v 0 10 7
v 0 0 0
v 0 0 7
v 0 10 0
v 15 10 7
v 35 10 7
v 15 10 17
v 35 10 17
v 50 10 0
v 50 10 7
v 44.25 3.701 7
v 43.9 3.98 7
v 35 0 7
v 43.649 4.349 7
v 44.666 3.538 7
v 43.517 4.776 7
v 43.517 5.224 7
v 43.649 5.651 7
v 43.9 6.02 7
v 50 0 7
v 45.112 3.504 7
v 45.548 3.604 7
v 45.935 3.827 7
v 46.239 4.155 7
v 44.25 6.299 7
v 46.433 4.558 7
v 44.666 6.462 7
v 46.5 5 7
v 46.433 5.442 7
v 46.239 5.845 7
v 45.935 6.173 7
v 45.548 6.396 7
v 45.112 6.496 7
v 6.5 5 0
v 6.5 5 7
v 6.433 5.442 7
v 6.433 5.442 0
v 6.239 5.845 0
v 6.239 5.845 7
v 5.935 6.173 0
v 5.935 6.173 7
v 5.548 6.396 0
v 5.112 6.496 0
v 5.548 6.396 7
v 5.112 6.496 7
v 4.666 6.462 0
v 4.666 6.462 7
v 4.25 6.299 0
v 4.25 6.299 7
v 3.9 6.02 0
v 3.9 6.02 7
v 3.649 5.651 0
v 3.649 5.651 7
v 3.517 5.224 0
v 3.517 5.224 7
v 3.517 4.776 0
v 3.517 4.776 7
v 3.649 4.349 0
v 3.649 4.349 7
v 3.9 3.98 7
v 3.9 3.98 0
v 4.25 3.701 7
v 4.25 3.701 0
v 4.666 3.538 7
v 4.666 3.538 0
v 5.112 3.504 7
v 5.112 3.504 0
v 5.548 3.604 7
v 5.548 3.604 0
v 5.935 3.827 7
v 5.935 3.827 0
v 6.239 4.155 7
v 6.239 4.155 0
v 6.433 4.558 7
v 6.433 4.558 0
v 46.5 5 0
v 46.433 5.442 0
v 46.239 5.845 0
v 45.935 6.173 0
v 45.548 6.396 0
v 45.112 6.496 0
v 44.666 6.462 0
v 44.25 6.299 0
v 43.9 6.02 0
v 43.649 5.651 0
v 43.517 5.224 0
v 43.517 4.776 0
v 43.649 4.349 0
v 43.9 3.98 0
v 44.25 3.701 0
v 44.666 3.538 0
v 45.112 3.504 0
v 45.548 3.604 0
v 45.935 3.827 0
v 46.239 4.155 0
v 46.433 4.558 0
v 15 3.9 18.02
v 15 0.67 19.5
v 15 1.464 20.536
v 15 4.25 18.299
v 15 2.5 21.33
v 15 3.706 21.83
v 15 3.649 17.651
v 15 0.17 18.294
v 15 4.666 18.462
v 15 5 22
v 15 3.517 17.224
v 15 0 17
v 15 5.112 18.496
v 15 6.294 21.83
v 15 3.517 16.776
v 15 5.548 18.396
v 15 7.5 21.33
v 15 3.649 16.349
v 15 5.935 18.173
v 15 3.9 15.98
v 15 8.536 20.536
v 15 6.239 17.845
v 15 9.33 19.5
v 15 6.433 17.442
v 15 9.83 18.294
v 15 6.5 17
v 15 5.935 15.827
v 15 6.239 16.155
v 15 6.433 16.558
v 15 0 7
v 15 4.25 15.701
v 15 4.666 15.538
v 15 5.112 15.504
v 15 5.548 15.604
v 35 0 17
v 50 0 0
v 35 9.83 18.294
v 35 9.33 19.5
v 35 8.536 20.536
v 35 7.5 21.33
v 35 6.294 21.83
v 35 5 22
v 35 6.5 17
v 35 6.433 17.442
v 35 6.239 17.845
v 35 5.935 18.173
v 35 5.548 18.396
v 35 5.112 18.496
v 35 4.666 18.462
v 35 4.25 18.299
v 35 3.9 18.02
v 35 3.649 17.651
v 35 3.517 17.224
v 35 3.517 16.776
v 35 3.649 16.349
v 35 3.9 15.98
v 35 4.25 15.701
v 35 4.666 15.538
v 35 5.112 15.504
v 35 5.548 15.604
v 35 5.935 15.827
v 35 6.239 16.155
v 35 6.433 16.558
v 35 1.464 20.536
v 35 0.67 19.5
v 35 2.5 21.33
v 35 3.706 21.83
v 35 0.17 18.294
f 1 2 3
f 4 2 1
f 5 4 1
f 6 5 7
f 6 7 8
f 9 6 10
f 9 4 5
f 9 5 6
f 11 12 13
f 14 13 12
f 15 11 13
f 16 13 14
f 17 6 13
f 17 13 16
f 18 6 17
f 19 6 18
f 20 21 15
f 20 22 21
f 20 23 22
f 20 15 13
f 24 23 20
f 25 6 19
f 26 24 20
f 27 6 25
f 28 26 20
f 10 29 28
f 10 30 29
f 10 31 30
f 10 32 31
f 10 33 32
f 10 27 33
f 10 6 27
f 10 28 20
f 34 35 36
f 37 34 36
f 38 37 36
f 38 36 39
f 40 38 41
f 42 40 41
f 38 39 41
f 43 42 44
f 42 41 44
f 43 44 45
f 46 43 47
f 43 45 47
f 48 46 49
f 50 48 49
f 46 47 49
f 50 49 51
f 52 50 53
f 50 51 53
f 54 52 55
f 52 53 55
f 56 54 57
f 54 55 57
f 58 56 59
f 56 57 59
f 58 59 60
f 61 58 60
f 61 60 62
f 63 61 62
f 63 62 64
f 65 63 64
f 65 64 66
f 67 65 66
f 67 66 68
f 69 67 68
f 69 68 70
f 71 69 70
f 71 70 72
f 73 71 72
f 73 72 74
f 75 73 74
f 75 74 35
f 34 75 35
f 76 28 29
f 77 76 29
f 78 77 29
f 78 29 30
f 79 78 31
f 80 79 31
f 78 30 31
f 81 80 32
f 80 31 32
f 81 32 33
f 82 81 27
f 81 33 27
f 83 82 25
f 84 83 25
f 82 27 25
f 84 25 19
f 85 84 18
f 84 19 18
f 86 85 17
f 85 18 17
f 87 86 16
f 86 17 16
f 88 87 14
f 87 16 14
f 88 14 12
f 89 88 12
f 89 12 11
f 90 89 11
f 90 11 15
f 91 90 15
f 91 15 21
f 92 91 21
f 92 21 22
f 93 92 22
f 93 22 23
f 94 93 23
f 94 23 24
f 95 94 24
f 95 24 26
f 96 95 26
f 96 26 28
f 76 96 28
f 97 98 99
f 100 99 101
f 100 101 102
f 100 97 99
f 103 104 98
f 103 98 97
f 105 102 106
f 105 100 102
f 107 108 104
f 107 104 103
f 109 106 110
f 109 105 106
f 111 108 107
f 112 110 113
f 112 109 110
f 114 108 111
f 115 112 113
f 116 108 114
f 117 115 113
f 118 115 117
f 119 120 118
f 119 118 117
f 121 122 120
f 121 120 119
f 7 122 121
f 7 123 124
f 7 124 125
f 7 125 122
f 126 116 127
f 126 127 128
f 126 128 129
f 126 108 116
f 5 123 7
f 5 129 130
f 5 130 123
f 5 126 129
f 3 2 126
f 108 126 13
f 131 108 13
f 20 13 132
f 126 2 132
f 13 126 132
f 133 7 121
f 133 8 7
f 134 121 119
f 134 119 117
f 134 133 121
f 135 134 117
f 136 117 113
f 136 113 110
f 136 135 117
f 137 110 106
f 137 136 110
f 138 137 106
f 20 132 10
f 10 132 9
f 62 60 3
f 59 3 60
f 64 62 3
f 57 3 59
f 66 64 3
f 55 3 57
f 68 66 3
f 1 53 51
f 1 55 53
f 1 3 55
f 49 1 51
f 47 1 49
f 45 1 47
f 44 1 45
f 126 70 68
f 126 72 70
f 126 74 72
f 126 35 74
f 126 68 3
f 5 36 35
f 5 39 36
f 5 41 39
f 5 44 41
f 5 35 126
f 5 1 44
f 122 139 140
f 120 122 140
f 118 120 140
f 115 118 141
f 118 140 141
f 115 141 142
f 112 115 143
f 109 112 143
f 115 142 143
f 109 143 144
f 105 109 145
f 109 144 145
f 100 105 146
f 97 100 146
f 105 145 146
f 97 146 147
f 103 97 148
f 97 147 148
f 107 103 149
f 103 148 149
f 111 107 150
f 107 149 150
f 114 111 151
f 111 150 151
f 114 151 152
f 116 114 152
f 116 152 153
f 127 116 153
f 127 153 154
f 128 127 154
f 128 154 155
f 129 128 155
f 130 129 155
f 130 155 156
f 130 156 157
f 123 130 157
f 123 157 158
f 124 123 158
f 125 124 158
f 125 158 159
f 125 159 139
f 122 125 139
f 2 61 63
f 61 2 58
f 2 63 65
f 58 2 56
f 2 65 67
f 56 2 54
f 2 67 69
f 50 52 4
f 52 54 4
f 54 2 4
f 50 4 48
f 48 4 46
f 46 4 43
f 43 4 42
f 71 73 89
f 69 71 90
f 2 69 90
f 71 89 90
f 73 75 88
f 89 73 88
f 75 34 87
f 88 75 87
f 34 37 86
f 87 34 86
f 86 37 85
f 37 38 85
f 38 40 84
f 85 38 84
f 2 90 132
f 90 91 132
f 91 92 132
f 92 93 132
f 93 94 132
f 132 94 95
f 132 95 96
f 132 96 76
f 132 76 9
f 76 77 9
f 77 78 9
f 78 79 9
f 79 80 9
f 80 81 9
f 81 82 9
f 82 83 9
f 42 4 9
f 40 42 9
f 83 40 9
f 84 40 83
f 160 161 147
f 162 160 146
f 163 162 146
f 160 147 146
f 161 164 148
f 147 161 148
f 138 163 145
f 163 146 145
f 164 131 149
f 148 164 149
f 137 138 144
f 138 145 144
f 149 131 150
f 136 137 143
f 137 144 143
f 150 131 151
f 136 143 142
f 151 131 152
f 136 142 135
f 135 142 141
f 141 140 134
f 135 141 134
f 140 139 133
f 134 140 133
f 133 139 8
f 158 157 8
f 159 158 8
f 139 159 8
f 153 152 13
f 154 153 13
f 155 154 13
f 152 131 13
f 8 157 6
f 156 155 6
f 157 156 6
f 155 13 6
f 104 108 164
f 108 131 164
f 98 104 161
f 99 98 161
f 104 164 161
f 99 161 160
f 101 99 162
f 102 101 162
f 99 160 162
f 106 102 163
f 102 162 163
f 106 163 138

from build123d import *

# Parameters (mm, degrees)
F0_W      = 50
F0_H      = 10
F1_DEPTH  = 7
F2_W      = 20
F2_H      = 10
F4_DEPTH  = 15
F5_R      = 4.99999
F3_R      = 1.5
F6_DEPTH  = 25
F7_R      = 1.5
F8_DEPTH  = 50
F10_W     = 10
F10_H     = 10
F11_DEPTH = 25


# Not quite as in the source:
# - a fillet or chamfer is up to 0.001 mm smaller than in the source, because OpenCascade refuses the exact size


with BuildPart() as f1:
    # F0 (on Top) → F1 (new body)
    with BuildSketch(Plane.XY):
        with Locations((25, 5)):
            Rectangle(F0_W, F0_H)
    extrude(amount=F1_DEPTH)

    # F2 (on face) → F4 (join)
    with BuildSketch(Plane.XY.offset(7)):
        with Locations((25, 5)):
            Rectangle(F2_W, F2_H)
    extrude(amount=F4_DEPTH)

    # F5 (radius 5 in the source; OpenCascade refuses exactly that, so slightly less here)
    f5_edges = [f1.edges().sort_by_distance(p)[0] for p in [
        (25, 10, 22),
        (25, 0, 22),
    ]]
    fillet(f5_edges, radius=F5_R)

    # F3 (on face) → F6 (cut)
    with BuildSketch(Plane.XY.offset(7)):
        with Locations((45, 5)):
            Circle(F3_R)
        with Locations((5, 5)):
            Circle(F3_R)
    extrude(amount=-F6_DEPTH, mode=Mode.SUBTRACT)

    # F7 (on face) → F8 (cut)
    with BuildSketch(Plane.YZ.offset(35)):
        with Locations((5, 17)):
            Circle(F7_R)
    extrude(amount=-F8_DEPTH, mode=Mode.SUBTRACT)


with BuildPart() as f9_1:
    # F9: copy of F1
    add(f1.part.moved(Location((0, 0, 40))))

    # F10 (on face) → F11 (cut)
    with BuildSketch(Plane.XY.offset(47)):
        with Locations((25, 5)):
            Rectangle(F10_W, F10_H)
    extrude(amount=F11_DEPTH, mode=Mode.SUBTRACT)


solid = f1.part
